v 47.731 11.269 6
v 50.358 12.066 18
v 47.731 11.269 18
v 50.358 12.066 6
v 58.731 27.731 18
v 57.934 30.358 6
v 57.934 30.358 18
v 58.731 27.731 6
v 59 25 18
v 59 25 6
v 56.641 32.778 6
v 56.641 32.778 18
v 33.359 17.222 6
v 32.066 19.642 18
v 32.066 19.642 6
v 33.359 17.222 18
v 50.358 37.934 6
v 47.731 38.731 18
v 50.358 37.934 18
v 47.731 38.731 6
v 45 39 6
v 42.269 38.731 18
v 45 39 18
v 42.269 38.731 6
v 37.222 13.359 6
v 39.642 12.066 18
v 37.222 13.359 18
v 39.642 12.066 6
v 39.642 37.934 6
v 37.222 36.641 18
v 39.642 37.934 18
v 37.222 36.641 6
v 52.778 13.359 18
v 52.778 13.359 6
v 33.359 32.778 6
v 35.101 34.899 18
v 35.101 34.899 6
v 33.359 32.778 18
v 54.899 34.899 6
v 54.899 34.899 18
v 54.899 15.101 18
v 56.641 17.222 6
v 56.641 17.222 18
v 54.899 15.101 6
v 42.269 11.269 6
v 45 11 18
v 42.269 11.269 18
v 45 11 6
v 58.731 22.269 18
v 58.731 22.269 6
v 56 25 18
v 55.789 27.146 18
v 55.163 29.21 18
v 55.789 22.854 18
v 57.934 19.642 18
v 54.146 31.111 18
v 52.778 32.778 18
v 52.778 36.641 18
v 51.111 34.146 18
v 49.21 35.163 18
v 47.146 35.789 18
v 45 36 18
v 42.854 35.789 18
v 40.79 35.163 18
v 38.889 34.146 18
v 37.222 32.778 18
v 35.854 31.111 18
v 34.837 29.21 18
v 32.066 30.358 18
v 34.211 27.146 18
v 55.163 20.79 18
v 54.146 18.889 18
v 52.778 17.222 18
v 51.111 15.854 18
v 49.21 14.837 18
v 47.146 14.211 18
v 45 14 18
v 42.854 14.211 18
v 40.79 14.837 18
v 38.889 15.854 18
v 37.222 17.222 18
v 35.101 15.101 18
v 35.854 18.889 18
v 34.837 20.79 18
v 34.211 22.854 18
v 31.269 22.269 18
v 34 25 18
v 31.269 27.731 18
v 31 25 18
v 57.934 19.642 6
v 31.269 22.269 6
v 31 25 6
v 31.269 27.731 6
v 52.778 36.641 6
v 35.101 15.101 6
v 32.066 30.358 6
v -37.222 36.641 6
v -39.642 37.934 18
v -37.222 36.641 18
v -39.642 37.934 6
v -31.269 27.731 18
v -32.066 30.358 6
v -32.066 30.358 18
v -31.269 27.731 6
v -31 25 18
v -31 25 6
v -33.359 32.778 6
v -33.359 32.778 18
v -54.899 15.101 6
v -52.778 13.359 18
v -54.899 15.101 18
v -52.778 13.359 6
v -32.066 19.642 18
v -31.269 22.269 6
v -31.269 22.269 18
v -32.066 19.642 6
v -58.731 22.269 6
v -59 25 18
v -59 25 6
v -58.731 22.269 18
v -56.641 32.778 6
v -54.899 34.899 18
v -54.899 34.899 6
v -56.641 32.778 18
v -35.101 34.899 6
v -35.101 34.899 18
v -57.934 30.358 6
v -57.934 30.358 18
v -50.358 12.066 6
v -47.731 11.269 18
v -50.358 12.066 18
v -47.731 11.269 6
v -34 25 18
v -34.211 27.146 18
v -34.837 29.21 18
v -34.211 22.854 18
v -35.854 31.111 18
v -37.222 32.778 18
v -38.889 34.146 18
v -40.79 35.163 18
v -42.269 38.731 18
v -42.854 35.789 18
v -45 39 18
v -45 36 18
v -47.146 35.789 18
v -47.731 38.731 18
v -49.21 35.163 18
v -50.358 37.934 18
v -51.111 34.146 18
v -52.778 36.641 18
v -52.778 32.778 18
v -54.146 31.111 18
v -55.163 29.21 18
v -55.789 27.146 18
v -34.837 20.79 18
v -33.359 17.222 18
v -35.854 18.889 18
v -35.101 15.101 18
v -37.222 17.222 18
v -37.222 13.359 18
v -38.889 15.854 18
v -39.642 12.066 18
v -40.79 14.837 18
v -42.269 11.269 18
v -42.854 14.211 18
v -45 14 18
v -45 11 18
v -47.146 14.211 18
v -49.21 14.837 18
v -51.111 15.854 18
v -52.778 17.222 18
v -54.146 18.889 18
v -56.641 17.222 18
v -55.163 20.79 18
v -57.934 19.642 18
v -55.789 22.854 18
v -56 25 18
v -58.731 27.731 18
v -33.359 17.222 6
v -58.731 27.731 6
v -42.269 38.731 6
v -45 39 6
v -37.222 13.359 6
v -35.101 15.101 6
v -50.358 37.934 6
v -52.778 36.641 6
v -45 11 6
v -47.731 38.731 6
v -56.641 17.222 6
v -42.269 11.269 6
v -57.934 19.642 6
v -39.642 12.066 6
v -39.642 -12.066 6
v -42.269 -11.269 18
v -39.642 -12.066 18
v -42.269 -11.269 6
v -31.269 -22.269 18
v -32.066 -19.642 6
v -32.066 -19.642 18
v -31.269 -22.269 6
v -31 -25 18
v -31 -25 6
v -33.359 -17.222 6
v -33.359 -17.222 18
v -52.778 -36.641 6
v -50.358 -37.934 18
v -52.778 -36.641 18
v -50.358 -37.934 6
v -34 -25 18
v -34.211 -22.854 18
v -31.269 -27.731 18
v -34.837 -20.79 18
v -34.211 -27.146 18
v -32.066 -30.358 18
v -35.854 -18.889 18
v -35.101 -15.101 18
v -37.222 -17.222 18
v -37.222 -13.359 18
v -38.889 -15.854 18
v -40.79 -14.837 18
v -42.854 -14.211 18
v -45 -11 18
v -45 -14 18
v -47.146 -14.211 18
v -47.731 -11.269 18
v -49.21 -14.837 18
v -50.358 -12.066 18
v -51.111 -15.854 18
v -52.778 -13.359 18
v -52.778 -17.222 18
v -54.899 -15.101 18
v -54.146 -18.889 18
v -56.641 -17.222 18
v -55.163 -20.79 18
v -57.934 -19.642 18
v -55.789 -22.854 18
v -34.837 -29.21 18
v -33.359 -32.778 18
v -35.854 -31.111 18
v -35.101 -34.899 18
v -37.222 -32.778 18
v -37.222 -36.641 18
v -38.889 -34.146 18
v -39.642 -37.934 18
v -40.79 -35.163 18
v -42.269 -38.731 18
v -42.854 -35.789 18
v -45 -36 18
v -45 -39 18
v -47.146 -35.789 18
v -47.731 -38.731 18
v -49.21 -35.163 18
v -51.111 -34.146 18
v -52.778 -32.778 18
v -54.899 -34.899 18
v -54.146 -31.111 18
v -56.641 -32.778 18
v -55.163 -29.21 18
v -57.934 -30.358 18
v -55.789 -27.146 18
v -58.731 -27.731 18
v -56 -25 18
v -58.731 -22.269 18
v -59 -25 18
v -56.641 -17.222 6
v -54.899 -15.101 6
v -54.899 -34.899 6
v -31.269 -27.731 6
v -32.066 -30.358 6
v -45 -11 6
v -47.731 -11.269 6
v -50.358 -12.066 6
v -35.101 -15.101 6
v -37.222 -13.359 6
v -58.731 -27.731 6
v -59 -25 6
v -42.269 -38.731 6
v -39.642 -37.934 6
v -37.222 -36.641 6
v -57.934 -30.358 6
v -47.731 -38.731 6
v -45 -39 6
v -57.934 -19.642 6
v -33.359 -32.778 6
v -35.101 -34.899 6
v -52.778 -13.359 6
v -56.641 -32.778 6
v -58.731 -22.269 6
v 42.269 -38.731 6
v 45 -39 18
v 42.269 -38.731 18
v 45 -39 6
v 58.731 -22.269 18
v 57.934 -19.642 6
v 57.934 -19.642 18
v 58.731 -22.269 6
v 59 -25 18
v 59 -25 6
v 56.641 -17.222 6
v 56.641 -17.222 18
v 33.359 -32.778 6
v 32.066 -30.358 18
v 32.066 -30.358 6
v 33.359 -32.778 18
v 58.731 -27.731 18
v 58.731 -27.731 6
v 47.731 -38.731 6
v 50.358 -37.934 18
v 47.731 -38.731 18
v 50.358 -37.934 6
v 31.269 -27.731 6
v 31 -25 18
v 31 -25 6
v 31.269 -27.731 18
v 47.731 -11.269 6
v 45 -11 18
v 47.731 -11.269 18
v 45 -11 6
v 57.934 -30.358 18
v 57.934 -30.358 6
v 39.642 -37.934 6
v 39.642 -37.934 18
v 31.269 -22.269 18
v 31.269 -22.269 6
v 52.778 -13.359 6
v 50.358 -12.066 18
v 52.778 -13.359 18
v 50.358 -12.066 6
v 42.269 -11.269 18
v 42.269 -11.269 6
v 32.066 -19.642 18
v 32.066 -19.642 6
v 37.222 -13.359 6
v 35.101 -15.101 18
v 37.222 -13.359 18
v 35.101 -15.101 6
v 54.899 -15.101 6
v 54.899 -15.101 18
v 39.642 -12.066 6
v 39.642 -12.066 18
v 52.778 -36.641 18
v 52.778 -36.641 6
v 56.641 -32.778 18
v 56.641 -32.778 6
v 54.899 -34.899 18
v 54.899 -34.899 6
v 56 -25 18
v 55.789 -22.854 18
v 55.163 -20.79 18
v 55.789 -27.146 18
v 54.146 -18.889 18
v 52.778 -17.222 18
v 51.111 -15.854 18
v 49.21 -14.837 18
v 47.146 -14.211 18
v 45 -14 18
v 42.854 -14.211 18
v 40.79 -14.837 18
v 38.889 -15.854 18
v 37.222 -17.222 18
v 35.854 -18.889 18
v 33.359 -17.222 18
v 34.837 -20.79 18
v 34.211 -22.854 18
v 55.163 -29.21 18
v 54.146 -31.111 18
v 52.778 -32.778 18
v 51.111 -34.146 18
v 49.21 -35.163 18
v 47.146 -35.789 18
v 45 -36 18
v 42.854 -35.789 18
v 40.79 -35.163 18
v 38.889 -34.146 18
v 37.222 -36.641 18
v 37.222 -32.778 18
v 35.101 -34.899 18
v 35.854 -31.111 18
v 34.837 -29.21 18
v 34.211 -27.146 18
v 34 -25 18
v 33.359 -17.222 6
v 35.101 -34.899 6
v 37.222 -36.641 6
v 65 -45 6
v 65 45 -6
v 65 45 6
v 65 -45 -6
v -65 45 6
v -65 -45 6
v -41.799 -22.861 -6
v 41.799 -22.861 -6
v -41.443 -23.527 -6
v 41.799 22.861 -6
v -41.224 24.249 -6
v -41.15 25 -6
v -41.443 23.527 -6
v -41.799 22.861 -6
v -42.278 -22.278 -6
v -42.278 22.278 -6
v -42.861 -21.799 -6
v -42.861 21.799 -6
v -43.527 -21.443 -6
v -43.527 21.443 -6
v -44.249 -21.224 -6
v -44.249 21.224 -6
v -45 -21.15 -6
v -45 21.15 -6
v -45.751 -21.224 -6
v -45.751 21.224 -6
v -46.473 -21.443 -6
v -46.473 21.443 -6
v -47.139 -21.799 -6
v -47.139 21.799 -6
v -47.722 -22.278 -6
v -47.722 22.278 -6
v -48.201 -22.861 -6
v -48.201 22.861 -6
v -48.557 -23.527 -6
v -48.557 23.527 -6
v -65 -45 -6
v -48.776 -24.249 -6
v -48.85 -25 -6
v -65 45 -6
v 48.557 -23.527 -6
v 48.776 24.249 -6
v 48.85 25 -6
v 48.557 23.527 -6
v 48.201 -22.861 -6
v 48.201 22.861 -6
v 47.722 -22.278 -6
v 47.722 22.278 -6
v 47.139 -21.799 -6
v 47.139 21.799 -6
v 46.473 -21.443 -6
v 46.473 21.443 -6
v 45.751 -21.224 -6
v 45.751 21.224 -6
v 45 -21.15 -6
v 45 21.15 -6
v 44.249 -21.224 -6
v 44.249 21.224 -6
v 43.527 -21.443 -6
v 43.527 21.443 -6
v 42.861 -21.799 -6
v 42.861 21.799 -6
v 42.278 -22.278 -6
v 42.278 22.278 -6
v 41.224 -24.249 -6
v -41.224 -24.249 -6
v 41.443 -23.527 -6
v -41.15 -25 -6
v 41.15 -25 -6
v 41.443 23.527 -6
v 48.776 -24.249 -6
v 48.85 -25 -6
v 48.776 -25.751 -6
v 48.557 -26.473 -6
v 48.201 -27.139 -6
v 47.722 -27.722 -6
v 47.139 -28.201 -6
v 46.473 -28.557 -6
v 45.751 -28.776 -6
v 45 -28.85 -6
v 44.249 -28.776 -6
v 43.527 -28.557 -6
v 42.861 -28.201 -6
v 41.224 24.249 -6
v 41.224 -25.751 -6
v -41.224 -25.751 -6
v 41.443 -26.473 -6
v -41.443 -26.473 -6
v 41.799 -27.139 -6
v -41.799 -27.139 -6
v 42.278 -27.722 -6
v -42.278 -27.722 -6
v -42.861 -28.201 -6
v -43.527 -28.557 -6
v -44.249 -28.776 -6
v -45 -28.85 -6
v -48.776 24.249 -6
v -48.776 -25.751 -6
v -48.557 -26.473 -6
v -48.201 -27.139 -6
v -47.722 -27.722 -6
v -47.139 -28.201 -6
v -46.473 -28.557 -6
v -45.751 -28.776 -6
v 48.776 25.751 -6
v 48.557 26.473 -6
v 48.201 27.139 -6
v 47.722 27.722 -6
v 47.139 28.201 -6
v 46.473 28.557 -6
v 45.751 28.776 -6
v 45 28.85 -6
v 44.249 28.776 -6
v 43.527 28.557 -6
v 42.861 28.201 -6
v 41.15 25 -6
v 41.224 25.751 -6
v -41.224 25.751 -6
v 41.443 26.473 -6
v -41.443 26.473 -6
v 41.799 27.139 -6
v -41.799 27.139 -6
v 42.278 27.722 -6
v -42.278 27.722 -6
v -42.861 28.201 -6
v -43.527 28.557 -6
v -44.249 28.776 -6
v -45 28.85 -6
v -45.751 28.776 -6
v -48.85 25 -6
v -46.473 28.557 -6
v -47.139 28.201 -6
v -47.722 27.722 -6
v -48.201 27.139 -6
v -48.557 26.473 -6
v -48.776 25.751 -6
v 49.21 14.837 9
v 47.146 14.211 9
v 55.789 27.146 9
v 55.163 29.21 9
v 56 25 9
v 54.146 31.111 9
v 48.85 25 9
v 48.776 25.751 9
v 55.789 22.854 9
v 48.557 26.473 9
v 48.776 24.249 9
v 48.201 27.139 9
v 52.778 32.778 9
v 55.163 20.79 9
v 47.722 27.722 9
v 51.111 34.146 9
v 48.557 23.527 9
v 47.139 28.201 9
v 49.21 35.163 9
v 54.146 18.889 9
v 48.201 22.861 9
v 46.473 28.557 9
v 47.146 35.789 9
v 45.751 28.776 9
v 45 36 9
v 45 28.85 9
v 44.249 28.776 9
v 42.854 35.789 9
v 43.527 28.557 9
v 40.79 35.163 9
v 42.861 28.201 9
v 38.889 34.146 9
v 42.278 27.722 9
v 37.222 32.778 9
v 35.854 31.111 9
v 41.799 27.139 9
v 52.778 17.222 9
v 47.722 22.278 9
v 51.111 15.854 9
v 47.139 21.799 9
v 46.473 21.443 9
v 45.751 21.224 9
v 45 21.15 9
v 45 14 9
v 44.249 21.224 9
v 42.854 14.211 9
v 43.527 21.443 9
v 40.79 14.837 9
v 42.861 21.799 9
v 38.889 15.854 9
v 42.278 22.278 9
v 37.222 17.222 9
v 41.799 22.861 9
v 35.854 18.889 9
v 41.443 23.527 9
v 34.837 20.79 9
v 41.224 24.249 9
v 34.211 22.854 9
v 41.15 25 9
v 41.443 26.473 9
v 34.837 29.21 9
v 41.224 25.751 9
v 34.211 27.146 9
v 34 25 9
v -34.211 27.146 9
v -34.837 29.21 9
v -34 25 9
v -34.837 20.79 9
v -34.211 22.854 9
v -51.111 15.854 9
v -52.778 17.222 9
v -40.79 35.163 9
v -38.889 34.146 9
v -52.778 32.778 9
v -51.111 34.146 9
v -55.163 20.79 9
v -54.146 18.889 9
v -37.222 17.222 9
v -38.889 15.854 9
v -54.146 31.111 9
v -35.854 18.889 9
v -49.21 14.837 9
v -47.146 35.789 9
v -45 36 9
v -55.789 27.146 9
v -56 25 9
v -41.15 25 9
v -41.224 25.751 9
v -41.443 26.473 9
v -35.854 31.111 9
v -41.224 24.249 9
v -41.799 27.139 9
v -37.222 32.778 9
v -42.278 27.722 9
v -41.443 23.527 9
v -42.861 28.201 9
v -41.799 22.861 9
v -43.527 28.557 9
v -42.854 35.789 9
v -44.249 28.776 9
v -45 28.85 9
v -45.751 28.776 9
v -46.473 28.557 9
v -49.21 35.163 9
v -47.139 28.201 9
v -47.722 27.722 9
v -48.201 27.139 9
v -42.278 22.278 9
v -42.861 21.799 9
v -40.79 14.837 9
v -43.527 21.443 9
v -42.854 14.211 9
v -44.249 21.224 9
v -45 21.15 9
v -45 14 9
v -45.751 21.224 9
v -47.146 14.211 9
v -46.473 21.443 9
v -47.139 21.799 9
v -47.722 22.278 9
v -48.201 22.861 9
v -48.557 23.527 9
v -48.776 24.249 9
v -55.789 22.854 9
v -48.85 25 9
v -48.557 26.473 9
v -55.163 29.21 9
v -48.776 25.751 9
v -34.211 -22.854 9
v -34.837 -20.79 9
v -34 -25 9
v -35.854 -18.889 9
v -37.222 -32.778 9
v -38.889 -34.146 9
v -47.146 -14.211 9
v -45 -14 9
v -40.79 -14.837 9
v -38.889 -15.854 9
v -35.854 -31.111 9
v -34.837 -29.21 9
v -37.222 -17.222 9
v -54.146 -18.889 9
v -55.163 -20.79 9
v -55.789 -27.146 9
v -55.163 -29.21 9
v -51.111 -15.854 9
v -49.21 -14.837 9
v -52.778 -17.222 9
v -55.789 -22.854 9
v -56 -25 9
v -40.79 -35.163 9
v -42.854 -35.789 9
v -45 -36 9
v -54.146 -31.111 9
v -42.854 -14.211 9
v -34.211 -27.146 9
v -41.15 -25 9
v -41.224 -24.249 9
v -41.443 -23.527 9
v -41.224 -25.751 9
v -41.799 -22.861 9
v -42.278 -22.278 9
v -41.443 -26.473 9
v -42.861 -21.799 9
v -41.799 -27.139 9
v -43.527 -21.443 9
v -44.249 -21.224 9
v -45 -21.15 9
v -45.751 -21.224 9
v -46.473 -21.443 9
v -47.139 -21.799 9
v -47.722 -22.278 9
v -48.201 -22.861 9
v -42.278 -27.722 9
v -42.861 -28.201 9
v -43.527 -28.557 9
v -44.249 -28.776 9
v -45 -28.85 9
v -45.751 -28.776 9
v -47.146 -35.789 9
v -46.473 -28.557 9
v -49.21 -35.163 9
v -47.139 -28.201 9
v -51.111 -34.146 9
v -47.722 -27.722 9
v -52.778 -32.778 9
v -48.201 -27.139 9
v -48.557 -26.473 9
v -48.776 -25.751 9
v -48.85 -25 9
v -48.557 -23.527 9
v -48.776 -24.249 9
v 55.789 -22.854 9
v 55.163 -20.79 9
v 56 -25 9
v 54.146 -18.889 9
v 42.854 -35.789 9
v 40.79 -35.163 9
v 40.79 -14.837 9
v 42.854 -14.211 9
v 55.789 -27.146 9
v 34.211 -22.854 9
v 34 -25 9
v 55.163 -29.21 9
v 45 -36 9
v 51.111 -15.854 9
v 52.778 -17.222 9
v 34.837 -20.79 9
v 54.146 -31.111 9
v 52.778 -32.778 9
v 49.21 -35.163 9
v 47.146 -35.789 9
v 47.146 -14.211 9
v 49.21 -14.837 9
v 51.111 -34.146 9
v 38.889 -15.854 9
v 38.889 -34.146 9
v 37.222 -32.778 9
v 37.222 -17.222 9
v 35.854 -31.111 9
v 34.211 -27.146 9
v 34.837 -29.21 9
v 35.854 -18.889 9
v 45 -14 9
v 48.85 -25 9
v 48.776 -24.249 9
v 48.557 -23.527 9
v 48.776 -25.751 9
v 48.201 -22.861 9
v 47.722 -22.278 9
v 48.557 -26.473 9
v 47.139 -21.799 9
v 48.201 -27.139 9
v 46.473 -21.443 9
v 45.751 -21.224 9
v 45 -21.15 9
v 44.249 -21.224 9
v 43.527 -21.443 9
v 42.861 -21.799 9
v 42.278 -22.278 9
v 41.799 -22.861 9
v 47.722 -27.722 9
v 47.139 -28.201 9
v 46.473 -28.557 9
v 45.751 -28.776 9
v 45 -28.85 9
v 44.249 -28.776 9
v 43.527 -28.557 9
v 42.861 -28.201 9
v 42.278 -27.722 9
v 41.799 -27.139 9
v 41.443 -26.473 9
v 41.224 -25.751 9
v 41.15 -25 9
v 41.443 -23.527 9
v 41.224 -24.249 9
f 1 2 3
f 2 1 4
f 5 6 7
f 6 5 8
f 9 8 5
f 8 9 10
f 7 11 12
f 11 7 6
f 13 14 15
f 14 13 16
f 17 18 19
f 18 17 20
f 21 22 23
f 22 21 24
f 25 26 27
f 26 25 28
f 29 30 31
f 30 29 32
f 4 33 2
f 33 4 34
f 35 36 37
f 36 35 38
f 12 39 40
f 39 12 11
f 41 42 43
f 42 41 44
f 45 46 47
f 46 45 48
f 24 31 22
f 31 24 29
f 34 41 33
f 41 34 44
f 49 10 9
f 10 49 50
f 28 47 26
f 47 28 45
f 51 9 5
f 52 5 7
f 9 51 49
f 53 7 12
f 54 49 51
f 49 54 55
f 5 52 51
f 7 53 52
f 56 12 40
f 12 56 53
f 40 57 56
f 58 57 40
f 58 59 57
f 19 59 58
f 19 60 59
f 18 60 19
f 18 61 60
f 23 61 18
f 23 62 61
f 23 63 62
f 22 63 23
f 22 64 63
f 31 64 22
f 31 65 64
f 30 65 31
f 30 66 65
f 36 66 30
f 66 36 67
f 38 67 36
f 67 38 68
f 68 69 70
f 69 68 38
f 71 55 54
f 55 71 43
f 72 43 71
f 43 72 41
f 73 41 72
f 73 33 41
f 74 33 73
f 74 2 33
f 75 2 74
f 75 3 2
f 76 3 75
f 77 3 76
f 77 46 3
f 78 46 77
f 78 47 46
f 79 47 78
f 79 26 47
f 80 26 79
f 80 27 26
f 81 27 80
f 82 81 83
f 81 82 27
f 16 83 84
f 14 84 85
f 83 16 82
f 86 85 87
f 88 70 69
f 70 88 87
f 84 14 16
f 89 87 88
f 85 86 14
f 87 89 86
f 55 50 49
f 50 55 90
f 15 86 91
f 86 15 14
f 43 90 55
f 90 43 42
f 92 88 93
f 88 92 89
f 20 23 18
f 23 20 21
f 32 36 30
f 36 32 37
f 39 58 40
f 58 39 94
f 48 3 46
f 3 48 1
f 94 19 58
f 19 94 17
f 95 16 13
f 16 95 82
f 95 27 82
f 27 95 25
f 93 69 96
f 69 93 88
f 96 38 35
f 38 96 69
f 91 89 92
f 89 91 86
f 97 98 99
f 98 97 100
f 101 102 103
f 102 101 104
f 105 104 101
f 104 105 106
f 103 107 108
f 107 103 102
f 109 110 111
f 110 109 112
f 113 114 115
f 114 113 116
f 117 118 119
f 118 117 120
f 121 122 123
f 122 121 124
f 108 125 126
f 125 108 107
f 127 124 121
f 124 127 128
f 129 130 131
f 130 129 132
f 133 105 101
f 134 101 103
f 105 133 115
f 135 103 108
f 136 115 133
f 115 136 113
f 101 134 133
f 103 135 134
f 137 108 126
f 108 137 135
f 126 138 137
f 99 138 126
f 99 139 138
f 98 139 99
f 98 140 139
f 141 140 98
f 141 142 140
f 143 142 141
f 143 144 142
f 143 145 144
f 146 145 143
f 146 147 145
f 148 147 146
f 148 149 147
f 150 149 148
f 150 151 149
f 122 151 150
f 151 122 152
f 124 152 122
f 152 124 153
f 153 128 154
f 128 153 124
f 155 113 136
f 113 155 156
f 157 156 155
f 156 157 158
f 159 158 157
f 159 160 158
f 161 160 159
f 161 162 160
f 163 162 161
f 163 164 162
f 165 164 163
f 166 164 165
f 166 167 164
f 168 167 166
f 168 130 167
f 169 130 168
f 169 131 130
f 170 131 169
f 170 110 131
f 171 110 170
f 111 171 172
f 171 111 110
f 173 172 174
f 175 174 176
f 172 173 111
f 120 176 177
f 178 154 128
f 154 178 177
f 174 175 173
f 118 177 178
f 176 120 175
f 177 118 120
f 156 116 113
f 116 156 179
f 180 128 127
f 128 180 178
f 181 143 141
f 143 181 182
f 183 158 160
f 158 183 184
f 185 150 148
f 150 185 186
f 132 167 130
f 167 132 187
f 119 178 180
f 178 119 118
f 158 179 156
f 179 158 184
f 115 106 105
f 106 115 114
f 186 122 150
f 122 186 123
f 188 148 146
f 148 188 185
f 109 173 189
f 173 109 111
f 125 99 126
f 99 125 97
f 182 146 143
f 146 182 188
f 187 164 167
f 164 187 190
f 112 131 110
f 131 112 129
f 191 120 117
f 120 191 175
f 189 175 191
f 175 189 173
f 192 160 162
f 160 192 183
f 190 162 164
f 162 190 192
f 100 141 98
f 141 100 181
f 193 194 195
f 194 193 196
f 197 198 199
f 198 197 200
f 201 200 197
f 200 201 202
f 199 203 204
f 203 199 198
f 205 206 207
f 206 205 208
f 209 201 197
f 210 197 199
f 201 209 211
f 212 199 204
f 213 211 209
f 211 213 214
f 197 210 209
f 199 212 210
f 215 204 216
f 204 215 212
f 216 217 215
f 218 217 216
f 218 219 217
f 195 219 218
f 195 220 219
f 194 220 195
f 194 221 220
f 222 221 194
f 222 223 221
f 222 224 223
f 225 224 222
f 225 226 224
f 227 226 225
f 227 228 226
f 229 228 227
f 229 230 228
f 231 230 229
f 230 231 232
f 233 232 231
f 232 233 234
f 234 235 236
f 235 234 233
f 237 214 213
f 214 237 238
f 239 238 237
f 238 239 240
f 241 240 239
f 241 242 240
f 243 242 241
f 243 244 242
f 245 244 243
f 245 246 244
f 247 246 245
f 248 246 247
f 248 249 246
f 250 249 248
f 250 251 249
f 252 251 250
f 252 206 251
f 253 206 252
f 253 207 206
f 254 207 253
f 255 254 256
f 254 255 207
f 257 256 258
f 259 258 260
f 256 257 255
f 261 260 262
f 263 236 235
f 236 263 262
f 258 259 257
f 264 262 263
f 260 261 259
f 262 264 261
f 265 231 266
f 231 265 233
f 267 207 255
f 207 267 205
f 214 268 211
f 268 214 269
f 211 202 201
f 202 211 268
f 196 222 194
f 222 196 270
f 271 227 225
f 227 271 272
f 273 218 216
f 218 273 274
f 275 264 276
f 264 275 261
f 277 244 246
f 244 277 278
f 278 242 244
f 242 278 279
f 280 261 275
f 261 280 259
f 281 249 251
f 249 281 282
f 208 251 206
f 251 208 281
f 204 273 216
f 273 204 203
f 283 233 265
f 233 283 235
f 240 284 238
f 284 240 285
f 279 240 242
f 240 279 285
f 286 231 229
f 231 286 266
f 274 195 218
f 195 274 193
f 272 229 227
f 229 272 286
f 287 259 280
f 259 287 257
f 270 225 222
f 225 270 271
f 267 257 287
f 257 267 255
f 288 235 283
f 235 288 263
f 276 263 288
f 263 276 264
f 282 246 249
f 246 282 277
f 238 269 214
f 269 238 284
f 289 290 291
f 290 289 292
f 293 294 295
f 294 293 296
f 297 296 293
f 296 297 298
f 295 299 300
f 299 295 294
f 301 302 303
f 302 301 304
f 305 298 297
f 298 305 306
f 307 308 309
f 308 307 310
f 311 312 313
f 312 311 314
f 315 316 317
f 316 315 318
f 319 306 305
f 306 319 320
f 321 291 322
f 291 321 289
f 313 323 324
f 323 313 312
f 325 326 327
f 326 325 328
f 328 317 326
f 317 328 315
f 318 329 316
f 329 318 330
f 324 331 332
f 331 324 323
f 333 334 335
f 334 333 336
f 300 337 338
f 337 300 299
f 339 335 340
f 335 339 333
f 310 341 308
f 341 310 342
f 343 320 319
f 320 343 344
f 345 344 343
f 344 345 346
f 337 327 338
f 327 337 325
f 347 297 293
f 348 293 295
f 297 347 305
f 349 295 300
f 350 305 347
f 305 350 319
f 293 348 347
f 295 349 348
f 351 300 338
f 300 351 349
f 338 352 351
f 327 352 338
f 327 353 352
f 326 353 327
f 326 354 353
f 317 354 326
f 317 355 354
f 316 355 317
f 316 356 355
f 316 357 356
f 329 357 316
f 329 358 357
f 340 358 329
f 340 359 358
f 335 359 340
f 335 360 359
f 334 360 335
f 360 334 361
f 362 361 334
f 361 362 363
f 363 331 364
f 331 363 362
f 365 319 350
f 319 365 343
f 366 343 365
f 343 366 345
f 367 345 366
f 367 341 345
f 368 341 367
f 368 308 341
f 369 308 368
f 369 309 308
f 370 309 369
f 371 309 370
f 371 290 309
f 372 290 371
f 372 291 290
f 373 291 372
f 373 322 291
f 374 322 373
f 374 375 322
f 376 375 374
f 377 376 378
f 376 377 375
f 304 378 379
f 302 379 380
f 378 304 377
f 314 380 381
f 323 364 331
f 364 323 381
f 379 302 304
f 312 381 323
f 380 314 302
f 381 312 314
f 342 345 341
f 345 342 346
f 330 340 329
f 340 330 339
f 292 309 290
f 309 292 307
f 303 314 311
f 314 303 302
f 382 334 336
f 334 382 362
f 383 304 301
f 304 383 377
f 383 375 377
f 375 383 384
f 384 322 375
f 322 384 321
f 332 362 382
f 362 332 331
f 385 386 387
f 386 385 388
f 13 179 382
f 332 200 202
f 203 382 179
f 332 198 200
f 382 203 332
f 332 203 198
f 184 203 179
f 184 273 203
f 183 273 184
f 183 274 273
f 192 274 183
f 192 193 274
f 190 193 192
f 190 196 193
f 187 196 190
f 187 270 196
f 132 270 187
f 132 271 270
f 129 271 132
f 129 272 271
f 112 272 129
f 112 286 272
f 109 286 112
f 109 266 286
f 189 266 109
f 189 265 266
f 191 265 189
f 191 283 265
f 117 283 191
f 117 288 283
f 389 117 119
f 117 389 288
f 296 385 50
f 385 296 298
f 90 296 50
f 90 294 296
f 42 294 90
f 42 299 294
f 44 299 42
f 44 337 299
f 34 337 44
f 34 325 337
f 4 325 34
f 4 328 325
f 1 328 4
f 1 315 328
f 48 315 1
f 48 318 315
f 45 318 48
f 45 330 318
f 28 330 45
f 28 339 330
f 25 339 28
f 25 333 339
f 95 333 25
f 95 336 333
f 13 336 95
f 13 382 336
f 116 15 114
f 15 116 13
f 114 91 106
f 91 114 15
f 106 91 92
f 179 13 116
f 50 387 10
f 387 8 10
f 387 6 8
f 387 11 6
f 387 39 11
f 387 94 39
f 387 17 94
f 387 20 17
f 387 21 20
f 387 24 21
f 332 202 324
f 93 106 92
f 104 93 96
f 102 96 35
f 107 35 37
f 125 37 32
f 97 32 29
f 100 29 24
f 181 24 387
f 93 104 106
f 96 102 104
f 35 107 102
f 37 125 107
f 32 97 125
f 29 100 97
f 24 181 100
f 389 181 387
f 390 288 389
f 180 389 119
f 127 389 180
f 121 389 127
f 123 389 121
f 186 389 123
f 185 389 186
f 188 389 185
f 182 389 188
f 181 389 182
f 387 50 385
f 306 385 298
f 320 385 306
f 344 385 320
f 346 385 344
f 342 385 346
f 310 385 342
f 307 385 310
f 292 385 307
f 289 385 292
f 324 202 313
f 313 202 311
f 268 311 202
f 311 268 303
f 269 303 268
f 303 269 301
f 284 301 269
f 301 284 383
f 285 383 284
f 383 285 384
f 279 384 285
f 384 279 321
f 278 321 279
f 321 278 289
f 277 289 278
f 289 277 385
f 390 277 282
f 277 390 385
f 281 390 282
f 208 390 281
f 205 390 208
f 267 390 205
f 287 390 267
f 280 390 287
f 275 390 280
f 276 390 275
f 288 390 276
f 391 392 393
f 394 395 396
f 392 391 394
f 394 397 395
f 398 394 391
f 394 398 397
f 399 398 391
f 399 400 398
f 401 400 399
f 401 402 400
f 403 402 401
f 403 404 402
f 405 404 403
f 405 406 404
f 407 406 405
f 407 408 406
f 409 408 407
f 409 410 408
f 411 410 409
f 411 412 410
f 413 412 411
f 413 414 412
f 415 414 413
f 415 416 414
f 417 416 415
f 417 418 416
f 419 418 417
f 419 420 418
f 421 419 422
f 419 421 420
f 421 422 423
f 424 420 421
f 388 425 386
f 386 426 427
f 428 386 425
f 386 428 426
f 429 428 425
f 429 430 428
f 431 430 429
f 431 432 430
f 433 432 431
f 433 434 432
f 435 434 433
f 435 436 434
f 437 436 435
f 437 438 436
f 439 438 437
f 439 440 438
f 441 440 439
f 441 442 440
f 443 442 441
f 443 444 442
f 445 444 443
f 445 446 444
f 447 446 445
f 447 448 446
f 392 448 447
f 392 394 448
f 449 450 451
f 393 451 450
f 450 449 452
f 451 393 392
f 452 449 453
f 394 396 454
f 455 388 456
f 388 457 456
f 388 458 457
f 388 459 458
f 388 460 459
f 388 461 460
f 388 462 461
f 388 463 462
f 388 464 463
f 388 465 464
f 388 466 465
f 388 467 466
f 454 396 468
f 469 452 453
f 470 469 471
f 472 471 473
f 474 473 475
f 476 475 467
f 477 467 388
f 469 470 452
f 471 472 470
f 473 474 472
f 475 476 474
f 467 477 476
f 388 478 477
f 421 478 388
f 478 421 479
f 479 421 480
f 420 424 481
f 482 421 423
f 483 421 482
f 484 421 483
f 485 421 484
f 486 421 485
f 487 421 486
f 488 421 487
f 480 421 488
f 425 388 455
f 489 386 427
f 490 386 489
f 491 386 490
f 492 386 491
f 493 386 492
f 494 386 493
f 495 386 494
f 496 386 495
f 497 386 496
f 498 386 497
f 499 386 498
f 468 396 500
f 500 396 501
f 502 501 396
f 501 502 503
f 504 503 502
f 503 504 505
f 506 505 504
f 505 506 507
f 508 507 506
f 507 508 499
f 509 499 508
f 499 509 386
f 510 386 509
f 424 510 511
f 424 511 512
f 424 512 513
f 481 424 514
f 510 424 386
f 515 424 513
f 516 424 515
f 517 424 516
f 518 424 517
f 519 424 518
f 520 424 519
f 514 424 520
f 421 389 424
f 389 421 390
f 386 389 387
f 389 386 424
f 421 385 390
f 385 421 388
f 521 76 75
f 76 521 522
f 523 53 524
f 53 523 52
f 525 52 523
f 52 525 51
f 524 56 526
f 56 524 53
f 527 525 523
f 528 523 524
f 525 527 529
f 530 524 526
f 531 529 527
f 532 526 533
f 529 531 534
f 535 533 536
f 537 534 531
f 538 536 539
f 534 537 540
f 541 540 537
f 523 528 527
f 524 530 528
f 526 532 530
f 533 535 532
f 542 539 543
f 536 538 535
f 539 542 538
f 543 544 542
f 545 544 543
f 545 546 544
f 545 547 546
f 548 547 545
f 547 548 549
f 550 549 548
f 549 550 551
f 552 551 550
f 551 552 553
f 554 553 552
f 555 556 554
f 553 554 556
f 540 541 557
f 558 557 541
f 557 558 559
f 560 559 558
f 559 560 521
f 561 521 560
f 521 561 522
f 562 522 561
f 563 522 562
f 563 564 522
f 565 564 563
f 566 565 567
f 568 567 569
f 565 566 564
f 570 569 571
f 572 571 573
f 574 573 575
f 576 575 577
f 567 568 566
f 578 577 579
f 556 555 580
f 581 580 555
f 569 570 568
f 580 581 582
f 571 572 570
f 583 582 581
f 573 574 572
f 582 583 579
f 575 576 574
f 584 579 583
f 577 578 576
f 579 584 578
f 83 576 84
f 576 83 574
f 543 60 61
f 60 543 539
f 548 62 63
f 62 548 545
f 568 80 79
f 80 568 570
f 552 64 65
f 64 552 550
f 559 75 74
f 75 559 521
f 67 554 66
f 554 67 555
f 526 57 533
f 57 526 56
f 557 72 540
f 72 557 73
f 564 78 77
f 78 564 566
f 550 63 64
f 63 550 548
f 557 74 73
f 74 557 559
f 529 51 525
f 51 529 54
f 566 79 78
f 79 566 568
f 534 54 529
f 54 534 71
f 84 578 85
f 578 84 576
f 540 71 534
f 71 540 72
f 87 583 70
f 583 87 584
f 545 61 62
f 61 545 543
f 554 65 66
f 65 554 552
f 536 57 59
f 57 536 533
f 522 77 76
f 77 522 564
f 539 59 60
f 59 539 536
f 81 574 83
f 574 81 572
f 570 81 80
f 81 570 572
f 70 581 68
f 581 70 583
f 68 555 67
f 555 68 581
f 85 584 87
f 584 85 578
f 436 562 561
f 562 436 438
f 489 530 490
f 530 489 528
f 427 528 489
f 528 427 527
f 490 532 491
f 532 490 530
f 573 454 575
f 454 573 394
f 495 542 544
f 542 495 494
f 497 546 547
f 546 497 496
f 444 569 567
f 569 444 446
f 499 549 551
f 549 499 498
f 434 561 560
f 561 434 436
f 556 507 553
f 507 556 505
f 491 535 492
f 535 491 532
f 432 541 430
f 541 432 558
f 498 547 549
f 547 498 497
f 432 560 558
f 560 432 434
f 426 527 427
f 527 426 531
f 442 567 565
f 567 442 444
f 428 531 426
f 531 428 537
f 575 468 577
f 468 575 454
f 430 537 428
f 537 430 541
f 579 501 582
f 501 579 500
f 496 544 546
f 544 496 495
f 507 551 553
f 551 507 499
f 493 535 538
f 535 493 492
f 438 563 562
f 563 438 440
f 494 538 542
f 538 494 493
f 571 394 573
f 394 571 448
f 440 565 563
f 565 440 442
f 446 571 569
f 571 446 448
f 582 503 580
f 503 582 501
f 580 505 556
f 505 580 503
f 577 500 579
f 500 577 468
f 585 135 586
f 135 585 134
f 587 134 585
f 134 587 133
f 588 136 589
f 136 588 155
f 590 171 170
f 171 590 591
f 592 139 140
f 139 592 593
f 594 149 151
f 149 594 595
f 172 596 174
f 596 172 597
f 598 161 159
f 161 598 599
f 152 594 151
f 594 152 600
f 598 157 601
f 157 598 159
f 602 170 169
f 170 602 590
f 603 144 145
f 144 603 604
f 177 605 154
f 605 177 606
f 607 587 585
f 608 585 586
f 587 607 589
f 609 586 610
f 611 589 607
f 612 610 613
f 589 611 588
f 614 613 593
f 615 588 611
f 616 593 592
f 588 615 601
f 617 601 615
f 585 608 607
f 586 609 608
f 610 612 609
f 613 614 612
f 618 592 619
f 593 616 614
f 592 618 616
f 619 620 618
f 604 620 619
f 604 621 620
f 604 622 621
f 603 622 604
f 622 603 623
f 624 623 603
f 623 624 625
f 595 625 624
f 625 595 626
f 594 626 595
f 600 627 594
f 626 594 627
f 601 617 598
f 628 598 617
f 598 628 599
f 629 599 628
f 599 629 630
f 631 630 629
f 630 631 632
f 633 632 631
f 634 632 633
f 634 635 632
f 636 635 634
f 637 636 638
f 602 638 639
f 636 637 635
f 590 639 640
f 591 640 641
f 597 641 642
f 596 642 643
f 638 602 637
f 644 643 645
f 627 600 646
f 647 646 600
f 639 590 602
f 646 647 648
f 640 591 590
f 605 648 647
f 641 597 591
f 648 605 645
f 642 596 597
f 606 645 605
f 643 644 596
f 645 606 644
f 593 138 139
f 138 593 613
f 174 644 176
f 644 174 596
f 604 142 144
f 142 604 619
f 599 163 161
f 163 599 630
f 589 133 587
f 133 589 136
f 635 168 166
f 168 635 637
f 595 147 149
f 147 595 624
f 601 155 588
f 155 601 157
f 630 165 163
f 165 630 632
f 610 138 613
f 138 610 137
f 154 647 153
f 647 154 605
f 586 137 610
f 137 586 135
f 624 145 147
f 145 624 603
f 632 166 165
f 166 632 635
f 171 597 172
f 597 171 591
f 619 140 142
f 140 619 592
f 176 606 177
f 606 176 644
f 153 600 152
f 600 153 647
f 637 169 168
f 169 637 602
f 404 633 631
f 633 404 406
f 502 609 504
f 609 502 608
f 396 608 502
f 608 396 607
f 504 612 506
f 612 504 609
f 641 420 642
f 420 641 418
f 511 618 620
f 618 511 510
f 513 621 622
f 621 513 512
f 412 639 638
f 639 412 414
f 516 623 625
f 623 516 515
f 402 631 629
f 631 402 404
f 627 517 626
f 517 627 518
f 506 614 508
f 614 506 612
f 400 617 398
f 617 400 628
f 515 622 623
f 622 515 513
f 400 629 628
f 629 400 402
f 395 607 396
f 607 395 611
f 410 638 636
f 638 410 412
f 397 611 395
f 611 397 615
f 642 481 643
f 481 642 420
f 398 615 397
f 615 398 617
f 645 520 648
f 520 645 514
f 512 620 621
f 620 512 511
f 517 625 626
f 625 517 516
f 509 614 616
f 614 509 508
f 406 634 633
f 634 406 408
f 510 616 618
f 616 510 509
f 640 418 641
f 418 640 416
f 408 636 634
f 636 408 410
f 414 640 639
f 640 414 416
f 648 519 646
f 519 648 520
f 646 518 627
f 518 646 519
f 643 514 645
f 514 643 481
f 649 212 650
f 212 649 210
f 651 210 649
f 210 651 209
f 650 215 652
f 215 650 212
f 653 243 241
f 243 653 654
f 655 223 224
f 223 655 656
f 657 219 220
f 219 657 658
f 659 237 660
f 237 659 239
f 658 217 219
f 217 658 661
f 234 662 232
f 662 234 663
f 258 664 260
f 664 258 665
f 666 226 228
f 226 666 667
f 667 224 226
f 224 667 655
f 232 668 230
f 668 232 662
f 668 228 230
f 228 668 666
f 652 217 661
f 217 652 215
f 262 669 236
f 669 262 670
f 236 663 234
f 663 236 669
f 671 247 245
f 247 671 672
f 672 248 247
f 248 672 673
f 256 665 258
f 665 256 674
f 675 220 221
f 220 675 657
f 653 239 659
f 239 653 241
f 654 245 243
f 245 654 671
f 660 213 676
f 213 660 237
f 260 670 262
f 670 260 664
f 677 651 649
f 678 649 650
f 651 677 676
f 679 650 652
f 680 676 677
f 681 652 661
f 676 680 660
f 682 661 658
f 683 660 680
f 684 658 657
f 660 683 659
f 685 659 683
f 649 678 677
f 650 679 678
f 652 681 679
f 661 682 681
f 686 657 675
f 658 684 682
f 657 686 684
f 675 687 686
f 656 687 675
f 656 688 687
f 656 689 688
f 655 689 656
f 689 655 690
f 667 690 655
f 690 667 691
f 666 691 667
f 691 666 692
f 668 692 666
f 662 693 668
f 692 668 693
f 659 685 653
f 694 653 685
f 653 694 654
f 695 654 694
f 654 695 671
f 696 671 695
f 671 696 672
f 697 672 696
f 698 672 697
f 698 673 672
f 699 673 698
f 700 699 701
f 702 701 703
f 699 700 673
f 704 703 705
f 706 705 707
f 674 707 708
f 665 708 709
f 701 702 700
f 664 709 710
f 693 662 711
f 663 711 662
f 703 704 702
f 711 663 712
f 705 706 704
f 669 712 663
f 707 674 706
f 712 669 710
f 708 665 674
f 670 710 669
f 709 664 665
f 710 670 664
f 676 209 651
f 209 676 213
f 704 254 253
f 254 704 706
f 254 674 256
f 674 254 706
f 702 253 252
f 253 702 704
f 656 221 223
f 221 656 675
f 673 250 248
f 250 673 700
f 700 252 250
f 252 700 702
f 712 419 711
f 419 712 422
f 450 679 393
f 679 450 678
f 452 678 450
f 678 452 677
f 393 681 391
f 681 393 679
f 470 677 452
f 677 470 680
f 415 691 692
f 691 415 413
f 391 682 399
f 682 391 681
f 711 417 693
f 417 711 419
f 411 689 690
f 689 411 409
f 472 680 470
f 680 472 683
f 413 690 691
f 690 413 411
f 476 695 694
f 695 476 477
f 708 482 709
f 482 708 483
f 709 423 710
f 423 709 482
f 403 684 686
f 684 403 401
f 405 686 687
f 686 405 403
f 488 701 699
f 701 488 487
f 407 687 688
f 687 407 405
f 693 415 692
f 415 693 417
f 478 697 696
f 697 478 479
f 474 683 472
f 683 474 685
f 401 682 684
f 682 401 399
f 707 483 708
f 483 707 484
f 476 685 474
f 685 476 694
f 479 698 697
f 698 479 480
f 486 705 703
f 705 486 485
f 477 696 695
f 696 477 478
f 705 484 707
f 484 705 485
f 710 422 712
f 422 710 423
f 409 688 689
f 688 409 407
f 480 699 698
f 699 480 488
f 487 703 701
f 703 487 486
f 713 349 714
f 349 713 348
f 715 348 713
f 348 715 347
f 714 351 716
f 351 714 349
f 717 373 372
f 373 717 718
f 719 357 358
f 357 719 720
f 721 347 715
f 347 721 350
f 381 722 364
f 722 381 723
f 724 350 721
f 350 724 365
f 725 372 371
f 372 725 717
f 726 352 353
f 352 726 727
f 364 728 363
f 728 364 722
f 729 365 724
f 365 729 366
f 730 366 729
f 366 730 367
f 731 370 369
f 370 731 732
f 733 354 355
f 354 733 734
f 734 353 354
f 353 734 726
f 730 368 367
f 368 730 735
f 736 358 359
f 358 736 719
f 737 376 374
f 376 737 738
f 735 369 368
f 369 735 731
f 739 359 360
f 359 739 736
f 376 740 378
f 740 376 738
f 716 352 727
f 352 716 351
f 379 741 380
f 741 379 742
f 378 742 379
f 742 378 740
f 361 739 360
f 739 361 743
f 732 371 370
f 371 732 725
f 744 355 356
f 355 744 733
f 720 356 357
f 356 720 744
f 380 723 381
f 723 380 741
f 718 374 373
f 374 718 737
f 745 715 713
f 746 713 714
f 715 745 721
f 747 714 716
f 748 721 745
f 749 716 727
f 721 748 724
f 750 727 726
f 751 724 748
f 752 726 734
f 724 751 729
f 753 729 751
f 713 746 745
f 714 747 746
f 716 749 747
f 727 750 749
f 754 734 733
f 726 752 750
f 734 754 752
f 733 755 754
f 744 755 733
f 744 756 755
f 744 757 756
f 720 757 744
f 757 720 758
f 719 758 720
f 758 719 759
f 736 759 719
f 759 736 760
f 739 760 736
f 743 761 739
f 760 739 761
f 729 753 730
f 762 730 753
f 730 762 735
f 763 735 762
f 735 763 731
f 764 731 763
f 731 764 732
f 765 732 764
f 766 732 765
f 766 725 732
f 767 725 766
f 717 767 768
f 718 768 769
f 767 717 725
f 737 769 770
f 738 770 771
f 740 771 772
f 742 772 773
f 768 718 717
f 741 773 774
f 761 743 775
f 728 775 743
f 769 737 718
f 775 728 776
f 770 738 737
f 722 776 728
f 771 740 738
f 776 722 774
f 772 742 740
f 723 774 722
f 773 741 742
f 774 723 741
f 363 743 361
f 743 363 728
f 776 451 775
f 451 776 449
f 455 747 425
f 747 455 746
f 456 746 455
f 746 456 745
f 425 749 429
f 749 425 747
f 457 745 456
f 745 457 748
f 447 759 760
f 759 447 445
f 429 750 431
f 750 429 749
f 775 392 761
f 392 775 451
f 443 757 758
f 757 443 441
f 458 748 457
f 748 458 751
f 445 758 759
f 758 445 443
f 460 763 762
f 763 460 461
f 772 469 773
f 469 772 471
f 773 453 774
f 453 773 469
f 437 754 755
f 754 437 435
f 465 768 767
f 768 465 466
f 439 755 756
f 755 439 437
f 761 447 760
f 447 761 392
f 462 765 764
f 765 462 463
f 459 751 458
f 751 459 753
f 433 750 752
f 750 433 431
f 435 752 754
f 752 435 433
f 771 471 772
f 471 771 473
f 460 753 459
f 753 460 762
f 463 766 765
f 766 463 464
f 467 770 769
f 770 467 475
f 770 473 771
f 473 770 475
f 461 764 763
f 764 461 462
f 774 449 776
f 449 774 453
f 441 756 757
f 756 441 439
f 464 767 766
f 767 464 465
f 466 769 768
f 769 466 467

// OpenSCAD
$fn = 32;

// ----------------------------------------------------------------------
// Socket pad plate
// bosses with counterbored sockets for the screws
// ----------------------------------------------------------------------

// --- parameters (mm) ---
base_t = 12;            // base plate thickness
boss_h = 12;            // boss height above the base plate
boss_d = 28;            // boss diameter
socket_d = 22;          // socket diameter
socket_depth = 9;       // socket depth from the boss face
bolt_d = 7.7;           // screw clearance hole through the socket floor
plate = [130, 90, 12];  // overall size (x, y, z)
edge = 20;              // boss centre offset from the plate edge
pads = 4;               // boss count, one per corner

// --- derived feature positions (mm) ---
height = base_t + boss_h;        // = 24   overall height of the part
corner_x = plate[0] / 2 - edge;  // = 45   boss centre X
corner_y = plate[1] / 2 - edge;  // = 25   boss centre Y
feature_centers = [
  [corner_x, corner_y],
  [-corner_x, corner_y],
  [-corner_x, -corner_y],
  [corner_x, -corner_y]
];   // boss centres: sockets, holes and the pads themselves are placed from here

// base plate, bosses on feature_centers, socket + through hole in each
difference() {
  union() {
    cube(plate, center = true);
    for (centre = feature_centers)
      translate([centre[0], centre[1], plate[2] / 2 - 1])
        cylinder(d = boss_d, h = boss_h + 1);
  }
  for (centre = feature_centers) {
    translate([centre[0], centre[1], plate[2] / 2 + boss_h - socket_depth])
      cylinder(d = socket_d, h = socket_depth + 1);
    translate([centre[0], centre[1], -height])
      cylinder(d = bolt_d, h = 2 * height + 2);  // through the socket floor
  }
}
